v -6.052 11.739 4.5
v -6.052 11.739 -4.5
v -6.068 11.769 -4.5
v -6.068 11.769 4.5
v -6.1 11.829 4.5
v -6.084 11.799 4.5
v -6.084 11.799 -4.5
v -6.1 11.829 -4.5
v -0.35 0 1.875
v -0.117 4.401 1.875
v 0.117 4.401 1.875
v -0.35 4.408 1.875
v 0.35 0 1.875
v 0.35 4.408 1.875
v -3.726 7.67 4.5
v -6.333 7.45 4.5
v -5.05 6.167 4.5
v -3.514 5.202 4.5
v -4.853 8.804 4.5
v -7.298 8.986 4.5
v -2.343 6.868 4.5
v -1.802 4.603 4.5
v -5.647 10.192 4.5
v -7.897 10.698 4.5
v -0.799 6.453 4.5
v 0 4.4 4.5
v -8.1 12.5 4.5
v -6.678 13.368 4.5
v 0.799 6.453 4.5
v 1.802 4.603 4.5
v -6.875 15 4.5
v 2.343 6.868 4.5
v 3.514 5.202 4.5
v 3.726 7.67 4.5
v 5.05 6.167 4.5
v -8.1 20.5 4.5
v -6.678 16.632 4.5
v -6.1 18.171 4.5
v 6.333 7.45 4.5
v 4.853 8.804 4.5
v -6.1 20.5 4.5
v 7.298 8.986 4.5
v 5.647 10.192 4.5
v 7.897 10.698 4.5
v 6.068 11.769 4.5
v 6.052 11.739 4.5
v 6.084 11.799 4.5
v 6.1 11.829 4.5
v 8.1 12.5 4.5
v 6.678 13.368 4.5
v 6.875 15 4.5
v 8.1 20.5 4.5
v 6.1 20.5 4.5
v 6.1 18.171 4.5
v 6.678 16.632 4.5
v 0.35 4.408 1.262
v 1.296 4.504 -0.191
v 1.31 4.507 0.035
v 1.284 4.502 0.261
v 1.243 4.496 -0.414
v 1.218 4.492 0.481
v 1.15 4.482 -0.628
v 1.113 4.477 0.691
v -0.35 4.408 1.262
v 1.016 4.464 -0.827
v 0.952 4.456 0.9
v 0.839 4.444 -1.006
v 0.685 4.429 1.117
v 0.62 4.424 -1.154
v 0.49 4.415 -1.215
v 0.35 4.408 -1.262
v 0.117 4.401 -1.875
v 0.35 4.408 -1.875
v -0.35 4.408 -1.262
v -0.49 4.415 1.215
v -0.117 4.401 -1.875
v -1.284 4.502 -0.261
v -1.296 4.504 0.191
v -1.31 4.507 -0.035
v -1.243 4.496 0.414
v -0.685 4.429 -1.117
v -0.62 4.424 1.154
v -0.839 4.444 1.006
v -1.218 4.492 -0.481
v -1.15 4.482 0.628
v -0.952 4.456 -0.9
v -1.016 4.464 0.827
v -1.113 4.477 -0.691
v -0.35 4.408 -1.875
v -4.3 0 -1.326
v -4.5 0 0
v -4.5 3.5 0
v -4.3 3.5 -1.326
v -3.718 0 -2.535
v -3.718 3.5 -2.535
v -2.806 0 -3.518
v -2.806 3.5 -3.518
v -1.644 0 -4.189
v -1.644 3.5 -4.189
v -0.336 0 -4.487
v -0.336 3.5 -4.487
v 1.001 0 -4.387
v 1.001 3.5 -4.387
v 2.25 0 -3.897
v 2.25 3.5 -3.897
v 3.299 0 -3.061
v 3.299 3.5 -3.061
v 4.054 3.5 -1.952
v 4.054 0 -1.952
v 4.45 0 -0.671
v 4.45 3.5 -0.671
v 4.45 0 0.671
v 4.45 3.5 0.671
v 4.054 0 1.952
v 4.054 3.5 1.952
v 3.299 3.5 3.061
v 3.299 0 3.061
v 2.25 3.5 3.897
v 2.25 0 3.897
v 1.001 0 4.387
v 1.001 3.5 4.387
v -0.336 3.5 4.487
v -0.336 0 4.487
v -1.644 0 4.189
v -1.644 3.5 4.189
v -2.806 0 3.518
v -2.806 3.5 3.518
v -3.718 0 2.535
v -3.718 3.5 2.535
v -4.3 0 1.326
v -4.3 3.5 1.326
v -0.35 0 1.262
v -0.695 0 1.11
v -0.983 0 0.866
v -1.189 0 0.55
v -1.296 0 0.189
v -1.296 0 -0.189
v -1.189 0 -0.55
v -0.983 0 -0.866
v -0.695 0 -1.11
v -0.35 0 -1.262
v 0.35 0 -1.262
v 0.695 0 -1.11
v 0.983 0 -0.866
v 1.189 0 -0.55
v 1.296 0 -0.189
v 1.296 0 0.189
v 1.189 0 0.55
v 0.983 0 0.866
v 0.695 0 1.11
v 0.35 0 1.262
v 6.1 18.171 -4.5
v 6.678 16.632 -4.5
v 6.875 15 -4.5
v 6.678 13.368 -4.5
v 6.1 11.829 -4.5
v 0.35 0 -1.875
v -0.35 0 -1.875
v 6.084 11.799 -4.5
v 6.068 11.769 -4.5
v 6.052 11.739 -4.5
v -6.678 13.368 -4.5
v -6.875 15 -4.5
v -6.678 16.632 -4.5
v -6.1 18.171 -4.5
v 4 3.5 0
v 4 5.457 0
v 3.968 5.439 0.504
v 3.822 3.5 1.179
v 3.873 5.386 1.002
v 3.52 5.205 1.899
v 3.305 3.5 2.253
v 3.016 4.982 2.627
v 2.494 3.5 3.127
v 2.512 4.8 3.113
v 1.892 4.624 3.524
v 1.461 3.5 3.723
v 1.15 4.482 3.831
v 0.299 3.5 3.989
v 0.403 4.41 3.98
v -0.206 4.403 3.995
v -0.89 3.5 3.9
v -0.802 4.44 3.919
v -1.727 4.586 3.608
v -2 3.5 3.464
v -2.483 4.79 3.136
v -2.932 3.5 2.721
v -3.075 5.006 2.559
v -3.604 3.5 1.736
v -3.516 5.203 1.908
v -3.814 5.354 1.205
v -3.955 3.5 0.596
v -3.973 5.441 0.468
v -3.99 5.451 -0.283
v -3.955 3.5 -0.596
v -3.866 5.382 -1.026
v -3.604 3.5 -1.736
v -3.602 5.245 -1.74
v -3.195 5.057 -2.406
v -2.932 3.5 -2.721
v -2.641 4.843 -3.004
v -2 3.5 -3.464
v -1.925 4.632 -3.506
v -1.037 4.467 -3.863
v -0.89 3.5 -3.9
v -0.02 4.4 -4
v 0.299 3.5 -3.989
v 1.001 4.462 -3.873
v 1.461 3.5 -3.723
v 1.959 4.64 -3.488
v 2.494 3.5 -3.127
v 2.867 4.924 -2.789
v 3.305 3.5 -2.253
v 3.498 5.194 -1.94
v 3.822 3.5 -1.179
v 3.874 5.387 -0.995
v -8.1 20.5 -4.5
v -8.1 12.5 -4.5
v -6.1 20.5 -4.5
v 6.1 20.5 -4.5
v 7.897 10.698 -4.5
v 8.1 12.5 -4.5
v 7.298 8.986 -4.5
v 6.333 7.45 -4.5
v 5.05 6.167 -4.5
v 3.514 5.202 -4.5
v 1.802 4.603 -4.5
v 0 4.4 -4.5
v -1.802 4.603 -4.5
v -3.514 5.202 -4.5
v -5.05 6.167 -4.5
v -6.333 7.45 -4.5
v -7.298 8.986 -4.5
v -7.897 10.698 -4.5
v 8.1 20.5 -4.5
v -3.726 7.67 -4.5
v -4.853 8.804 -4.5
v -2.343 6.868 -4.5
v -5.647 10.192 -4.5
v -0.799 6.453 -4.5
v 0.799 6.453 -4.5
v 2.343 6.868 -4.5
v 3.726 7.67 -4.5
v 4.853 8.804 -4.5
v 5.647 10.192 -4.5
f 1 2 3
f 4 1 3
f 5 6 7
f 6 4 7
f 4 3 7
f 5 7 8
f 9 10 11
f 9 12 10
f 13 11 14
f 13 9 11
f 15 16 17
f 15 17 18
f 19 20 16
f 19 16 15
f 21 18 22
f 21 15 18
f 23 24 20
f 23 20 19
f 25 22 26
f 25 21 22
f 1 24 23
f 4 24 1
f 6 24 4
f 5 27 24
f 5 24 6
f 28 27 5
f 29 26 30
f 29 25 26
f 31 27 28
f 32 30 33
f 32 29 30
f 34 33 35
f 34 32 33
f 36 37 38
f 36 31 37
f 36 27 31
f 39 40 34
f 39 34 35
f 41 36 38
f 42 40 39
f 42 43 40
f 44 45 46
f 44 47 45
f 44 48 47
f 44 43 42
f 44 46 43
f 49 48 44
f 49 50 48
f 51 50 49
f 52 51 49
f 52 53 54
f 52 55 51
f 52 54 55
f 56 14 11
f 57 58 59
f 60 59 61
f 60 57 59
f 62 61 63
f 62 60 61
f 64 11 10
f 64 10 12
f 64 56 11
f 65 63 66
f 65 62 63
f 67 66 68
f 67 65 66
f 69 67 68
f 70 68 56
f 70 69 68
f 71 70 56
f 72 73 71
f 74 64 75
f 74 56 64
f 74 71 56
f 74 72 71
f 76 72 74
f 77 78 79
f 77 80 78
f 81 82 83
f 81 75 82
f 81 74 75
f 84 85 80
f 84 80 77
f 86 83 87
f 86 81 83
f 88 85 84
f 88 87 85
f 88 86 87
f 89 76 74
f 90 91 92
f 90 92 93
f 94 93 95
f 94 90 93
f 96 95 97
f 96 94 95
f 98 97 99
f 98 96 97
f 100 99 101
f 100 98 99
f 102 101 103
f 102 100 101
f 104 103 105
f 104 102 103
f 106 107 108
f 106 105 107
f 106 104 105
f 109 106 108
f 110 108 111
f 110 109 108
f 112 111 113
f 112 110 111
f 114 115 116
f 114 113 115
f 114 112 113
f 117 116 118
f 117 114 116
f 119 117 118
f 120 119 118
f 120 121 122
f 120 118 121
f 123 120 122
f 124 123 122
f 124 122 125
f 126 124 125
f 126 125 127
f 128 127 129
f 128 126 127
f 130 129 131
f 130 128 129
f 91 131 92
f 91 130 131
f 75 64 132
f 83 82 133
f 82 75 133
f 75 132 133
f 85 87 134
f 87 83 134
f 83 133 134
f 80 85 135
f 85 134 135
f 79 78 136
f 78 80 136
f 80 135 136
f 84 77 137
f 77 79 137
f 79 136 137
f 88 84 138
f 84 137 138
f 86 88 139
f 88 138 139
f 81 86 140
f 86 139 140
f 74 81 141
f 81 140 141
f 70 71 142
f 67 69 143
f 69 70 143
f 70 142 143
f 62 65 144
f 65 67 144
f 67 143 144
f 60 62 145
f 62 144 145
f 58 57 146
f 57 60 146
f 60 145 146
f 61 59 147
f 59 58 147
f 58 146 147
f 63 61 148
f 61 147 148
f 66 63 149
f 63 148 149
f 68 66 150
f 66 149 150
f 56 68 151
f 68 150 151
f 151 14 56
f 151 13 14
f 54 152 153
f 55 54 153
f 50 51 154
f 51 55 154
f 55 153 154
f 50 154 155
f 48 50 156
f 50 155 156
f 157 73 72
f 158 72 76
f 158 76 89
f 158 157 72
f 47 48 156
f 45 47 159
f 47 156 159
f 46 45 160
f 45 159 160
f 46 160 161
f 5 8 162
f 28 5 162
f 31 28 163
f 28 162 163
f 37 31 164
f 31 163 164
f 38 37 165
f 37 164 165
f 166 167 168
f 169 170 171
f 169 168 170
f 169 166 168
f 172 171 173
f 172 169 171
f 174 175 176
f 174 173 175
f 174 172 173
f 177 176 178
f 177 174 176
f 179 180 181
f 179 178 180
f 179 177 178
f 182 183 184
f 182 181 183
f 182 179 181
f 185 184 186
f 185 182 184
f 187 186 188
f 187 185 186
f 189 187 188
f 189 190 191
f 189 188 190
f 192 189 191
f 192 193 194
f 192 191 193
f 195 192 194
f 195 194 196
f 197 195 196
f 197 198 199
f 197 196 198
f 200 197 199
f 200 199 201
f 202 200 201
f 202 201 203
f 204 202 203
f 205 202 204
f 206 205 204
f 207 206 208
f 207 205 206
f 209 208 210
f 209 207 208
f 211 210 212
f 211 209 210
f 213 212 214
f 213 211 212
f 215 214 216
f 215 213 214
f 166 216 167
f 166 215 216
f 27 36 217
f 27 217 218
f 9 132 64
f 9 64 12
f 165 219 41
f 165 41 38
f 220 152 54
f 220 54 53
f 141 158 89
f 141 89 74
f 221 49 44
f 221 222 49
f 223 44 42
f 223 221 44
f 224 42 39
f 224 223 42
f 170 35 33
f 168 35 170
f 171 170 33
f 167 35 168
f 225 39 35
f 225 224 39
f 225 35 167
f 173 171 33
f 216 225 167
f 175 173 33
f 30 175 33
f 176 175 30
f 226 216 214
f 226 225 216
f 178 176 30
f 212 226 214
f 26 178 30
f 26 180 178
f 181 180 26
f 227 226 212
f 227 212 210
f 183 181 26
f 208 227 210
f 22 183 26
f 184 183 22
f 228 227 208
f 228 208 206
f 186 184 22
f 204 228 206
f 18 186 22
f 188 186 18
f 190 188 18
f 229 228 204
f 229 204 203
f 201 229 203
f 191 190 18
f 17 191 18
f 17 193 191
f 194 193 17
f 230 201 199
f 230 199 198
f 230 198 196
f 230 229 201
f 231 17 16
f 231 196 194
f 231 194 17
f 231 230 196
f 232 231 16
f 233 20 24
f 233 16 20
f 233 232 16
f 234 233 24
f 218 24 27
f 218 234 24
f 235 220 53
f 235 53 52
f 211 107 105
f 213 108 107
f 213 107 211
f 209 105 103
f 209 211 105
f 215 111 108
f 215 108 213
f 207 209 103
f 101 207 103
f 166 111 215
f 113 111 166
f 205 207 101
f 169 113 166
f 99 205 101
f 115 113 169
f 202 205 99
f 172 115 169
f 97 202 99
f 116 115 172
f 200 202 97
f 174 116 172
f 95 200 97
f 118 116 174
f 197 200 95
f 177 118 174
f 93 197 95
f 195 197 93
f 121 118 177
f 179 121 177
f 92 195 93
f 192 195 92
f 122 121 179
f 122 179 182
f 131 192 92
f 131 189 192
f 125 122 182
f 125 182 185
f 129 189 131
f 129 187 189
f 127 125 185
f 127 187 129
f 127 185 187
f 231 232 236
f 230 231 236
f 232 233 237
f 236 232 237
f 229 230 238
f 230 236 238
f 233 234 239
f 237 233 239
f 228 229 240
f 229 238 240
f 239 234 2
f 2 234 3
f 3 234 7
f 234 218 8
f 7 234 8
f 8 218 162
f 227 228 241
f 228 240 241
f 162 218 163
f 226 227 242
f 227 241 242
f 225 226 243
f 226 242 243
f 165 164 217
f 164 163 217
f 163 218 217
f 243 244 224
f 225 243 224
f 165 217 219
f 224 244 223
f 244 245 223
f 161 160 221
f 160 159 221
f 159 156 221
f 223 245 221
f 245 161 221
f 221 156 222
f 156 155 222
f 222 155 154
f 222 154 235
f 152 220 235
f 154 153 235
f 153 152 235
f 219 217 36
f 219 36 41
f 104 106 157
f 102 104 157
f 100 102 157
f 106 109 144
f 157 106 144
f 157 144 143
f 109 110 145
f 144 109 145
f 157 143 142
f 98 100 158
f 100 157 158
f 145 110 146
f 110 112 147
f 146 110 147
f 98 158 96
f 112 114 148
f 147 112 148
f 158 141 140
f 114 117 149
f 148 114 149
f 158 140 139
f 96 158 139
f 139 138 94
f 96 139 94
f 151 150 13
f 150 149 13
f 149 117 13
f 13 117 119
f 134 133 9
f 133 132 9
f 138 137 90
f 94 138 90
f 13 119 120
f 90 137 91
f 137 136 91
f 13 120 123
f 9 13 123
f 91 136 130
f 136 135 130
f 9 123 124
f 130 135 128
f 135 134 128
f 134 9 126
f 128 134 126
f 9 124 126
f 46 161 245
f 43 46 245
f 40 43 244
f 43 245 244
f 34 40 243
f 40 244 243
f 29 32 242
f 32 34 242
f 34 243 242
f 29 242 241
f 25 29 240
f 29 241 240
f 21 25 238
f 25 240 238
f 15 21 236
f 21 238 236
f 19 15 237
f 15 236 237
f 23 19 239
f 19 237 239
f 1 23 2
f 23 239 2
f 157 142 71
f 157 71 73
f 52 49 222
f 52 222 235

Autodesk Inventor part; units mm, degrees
ref_plane "YZ Plane" through (0, 0, 0) normal (1, 0, 0) x (0, 1, 0)
ref_plane "XZ Plane" through (0, 0, 0) normal (0, 1, 0) x (-1, 0, 0)
ref_plane "XY Plane" through (0, 0, 0) normal (0, 0, 1) x (1, 0, 0)
sketch "Sketch1" plane through (0, 0, 0) normal (0, 1, 0) x (-1, 0, 0)
  circle A0 centre (0, 0) radius 1.05 construction
  arc A1 (-0.35, 1.2624) -> (-0.35, -1.2624) centre (0, 0) ccw
  circle A2 centre (0, 0) radius 4.5
  line L0 (0.35, 1.875) -> (-0.35, 1.875)
  line L1 (-0.35, 1.875) -> (-0.35, -1.875)
  line L2 (-0.35, -1.875) -> (0.35, -1.875)
  line L3 (0.35, -1.875) -> (0.35, 1.875)
  arc A3 (0.35, 1.2624) -> (-0.35, 1.2624) centre (0, 0) ccw
  arc A4 (0.35, -1.2624) -> (0.35, 1.2624) centre (0, 0) ccw
  arc A5 (-0.35, -1.2624) -> (0.35, -1.2624) centre (0, 0) ccw
  point P0 (0, 1.875)
  point P1 (0.35, 0)
  dimension "d1" = 2.1
  dimension "d3" = 9
  dimension "d18" = 0.26
  dimension "d19" = 0.7
  dimension "d20" = 3.75
extrude "Extrusion1" add sketch "Sketch1" along normal blind 3.5
sketch "Sketch4" plane through (0, 0, 0) normal (0, 0, 1) x (1, 0, 0)
  line L0 (-8.1, 20.5) -> (-8.1, 12.5)
  arc A0 (-8.1, 12.5) -> (8.1, 12.5) centre (0, 12.5) ccw
  line L1 (8.1, 12.5) -> (8.1, 20.5)
  line L2 (-6.1, 20.5) -> (-6.1, 18.1711)
  arc A1 (-6.1, 12.5) -> (-6.0523, 11.7389) centre (0, 12.5) ccw
  line L3 (6.1, 12.5) -> (6.1, 11.8289)
  line L4 (-8.1, 20.5) -> (-6.1, 20.5)
  line L5 (6.1, 20.5) -> (8.1, 20.5)
  line L6 (-0.35, 0) -> (0.35, 0) projected
  line L7 (4.5, 3.5) -> (-4.5, 3.5) projected
  arc A2 (-6.0523, 11.7389) -> (6.0523, 11.7389) centre (0, 15) ccw
  line L8 (-6.1, 18.1711) -> (-6.1, 11.8289)
  line L9 (-6.1, 11.8289) -> (-6.1, 12.5)
  line L10 (6.1, 11.8289) -> (6.1, 18.1711)
  line L11 (6.1, 18.1711) -> (6.1, 20.5)
  arc A3 (-6.1, 11.8289) -> (-6.0523, 11.7389) centre (0, 15) ccw
  arc A4 (6.1, 11.8289) -> (-6.1, 11.8289) centre (0, 15) ccw
  arc A5 (6.0523, 11.7389) -> (6.1, 11.8289) centre (0, 15) ccw
  arc A6 (6.0523, 11.7389) -> (6.1, 12.5) centre (0, 12.5) ccw
  arc A7 (-6.0523, 11.7389) -> (6.0523, 11.7389) centre (0, 12.5) ccw
  point P0 (0, 0)
  point P1 (0, 0)
  dimension "d23" = 2
  dimension "d24" = 9
  dimension "d25" = 8
  dimension "d26" = 13.75
  dimension "d27" = 2.5
  dimension "d36" = 12.2
extrude "Extrusion5" add sketch "Sketch4" along normal mid plane 9 contours L4 L2 A4 A3 A7 A5 L11 L5 L1 A0 L0
sketch "Sketch8" plane through (0, 3.5, 0) normal (0, 1, 0) x (1, 0, 0)
  circle A0 centre (0, 0) radius 4
  arc A1 (0.35, -1.2624) -> (0.35, 1.2624) centre (0, 0) ccw projected
  line L0 (0.35, 1.875) -> (0.35, 1.2624) projected
  line L1 (-0.35, 1.875) -> (0.35, 1.875) projected
  line L2 (-0.35, 1.2624) -> (-0.35, 1.875) projected
  arc A2 (-0.35, 1.2624) -> (-0.35, -1.2624) centre (0, 0) ccw projected
  line L3 (-0.35, -1.875) -> (-0.35, -1.2624) projected
  line L4 (0.35, -1.875) -> (-0.35, -1.875) projected
  line L5 (0.35, -1.2624) -> (0.35, -1.875) projected
  dimension "d33" = 8
extrude "Extrusion6" add sketch "Sketch8" along normal up to next
sketch "Sketch2" plane through (0, 3.5, 0) normal (0, 1, 0) x (1, 0, 0)
  circle A0 centre (0, 0) radius 1.31 projected
  circle A1 centre (0, 0) radius 3.31
  dimension "d6" = 2
  dimension "d9" = 7.3
  dimension "d10" = 2
properties part number "LaserDiodeAdapterLarge" material "ABS Plastic"
